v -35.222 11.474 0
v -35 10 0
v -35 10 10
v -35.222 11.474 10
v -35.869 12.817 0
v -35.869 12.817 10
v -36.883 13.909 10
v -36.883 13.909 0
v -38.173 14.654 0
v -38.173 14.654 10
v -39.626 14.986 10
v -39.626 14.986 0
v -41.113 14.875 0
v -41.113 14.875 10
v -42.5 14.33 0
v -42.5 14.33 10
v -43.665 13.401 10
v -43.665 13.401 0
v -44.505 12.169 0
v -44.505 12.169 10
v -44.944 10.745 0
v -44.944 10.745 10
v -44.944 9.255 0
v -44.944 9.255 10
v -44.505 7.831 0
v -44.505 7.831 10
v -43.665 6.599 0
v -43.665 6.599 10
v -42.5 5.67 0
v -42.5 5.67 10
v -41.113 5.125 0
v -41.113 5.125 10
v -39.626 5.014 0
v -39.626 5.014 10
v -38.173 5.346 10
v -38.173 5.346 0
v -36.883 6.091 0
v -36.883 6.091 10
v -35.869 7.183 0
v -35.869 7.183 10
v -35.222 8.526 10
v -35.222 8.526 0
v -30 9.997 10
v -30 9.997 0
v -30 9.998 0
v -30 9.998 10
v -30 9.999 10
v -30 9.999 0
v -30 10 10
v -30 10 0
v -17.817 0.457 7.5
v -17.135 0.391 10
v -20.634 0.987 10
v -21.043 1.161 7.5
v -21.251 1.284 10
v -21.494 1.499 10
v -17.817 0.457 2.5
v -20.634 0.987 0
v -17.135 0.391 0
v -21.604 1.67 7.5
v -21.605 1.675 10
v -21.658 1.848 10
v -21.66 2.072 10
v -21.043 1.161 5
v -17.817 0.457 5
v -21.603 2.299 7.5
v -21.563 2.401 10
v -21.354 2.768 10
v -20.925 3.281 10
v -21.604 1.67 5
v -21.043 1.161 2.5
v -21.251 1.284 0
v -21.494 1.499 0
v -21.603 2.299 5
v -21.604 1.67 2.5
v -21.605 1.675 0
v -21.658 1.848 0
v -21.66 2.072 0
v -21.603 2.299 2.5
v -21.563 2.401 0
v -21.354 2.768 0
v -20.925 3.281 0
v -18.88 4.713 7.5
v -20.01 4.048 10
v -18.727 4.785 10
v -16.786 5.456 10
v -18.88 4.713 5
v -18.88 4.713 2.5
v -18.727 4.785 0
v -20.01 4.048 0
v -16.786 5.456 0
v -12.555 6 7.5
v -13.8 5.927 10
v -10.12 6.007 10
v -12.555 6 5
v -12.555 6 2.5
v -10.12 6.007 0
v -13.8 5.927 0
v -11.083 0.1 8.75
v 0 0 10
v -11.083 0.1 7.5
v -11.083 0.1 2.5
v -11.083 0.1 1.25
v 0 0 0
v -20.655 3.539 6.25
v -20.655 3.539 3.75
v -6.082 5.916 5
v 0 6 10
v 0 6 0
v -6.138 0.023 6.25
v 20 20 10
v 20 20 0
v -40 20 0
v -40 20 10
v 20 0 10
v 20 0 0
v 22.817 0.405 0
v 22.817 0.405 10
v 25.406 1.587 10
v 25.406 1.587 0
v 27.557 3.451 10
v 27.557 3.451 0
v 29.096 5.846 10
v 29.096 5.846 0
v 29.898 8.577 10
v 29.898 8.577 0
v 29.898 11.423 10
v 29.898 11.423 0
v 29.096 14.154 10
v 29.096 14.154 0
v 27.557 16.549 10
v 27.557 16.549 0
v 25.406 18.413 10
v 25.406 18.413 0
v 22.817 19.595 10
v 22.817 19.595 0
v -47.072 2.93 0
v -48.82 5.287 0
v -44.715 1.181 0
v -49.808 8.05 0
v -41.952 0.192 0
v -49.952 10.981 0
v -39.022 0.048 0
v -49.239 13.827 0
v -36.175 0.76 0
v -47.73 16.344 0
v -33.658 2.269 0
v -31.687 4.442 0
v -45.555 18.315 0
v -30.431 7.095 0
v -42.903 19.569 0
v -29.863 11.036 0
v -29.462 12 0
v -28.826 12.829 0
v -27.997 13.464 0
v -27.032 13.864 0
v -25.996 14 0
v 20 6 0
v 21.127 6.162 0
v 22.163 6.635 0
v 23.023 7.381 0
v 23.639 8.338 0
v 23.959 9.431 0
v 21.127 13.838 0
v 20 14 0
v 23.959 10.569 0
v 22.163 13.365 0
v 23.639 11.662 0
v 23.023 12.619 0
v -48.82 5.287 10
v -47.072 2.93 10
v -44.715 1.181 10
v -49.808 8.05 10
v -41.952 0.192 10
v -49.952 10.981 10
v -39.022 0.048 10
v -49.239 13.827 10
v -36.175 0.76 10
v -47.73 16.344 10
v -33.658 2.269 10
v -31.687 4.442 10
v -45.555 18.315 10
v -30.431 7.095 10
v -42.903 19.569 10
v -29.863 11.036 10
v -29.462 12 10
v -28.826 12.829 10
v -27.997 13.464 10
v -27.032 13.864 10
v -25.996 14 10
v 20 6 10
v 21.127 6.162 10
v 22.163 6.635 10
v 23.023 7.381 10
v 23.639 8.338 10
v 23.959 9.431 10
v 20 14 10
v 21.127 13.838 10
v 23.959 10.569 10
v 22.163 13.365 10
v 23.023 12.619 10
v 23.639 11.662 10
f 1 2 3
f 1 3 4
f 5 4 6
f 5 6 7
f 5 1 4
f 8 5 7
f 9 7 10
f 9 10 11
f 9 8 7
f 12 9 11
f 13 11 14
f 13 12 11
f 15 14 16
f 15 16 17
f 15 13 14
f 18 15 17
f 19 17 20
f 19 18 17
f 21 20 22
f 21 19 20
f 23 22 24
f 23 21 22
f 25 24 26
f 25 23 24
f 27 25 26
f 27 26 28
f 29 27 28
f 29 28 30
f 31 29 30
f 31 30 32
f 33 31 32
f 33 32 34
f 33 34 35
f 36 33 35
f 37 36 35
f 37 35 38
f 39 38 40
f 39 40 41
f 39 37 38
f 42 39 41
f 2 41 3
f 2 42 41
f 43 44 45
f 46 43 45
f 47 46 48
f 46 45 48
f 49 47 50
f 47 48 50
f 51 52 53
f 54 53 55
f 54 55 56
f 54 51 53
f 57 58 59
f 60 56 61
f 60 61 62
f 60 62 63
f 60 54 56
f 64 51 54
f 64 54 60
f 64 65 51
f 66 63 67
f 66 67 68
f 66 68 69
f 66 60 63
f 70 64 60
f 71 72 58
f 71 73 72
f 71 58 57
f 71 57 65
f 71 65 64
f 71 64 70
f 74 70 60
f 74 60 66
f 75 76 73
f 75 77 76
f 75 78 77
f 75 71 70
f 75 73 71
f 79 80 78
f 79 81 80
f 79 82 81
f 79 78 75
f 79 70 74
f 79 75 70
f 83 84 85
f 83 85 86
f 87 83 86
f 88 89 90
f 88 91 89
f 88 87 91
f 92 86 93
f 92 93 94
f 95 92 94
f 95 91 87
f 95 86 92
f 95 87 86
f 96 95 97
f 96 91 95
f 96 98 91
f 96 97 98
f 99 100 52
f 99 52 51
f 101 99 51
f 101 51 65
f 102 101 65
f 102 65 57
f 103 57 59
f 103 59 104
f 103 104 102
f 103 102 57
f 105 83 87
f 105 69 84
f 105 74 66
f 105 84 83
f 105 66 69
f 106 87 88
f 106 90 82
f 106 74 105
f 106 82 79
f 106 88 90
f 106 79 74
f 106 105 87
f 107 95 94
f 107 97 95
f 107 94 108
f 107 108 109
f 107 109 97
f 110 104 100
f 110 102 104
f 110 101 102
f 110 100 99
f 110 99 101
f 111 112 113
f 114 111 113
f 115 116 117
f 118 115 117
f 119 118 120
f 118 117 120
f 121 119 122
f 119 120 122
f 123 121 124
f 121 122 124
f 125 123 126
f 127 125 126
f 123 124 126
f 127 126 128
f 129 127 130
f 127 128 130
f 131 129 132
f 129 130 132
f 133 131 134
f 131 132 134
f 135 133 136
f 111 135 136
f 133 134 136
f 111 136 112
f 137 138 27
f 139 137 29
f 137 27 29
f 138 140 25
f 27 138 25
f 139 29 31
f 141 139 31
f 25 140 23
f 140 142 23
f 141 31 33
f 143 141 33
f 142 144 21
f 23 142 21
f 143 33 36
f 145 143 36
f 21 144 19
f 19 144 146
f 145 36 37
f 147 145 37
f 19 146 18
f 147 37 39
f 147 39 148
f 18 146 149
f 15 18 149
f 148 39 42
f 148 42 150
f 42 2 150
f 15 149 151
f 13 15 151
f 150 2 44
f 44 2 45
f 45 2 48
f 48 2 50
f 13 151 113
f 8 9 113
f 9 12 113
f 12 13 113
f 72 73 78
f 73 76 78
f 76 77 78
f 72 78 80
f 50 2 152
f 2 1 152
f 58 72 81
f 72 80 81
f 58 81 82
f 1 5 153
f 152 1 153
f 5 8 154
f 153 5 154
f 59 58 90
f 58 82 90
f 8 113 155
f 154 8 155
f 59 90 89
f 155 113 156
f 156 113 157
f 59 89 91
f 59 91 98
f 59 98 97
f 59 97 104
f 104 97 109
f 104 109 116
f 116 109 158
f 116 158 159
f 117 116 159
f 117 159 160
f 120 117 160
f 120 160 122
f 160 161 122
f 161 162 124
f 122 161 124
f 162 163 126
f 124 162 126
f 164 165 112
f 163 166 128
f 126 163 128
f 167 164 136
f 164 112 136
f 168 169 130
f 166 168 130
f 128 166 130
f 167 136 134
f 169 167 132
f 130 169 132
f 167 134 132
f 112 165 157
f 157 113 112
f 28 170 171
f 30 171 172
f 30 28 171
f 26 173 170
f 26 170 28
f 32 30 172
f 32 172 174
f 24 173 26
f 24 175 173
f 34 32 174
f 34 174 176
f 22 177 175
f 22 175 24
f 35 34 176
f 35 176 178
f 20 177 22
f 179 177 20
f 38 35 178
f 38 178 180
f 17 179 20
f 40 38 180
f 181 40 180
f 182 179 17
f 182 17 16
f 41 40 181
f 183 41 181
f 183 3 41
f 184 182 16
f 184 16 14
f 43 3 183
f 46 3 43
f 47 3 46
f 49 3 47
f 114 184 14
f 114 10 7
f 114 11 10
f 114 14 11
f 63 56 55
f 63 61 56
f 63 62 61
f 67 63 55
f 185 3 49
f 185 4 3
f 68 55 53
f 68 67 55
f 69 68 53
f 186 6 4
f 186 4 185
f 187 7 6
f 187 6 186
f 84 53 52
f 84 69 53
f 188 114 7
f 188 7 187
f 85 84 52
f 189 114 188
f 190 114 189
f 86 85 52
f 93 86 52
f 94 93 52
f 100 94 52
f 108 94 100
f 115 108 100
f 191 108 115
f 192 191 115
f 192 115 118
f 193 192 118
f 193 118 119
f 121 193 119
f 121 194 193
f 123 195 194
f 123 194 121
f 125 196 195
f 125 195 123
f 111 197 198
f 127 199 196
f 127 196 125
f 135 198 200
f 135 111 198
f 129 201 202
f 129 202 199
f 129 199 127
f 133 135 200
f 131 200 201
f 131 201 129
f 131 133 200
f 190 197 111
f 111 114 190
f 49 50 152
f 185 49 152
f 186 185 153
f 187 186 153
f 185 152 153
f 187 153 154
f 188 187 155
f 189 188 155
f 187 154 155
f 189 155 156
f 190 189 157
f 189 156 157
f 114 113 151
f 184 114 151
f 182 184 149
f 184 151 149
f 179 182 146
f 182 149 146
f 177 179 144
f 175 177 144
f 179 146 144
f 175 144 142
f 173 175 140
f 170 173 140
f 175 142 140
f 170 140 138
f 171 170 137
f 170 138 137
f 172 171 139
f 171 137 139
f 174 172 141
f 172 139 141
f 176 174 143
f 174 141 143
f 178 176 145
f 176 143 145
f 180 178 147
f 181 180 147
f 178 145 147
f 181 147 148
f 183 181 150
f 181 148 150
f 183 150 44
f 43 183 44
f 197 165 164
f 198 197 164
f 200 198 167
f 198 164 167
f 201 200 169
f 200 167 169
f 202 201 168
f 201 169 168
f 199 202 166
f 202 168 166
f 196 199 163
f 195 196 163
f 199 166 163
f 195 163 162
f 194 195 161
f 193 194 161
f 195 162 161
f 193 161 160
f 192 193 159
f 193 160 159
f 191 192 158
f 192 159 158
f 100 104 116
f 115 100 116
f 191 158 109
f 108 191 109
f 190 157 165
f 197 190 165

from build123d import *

# Parameters (mm, degrees)
F0_R     = 5
F1_DEPTH = 10


# Not quite as in the source:
# - ends of sketch curves that miss each other by under 0.0002 mm in the source are joined


with BuildPart() as f1:
    # F0 (on Top) → F1 (new body)
    with BuildSketch(Plane.XY):
        with BuildLine():
            ThreePointArc((-30.0000003377, 9.9974011055), (-30.0000000844, 9.9987005527), (-30, 10))
            ThreePointArc((-30, 10), (-32.9289321881, 17.0710678119), (-40, 20))
            ThreePointArc((-40, 20), (-47.0719866001, 2.9298510958), (-30.0000003377, 9.9974011055))
        make_face()
        with Locations((-40, 10)):
            Circle(F0_R, mode=Mode.SUBTRACT)
        with BuildLine():
            ThreePointArc((-40, 20), (-32.9289321881, 17.0710678119), (-30, 10))
            ThreePointArc((-30, 10), (-28.8260746289, 12.8286475986), (-25.9963610747, 14))
            Line((-25.9963610747, 14), (20, 14))
            ThreePointArc((20, 14), (24, 10), (20, 6))
            Line((20, 6), (0, 6))
            add(Edge.make_bspline(
                [(0, 0), (-18.0512891521, 0), (-23.9813730686, 0.6377710425), (-18.8085221866, 5.3625723562), (-11.4536762775, 6.3679885575), (-6.8766033776, 5.7466003341), (0, 6)],
                knots=[0, 0, 0, 0, 0.3683888151, 0.5191562868, 0.7199539542, 1, 1, 1, 1], degree=3))
            Line((0, 0), (20, 0))
            ThreePointArc((20, 0), (30, 10), (20, 20))
            Line((20, 20), (-40, 20))
        make_face()
    extrude(amount=F1_DEPTH)


solid = f1.part
